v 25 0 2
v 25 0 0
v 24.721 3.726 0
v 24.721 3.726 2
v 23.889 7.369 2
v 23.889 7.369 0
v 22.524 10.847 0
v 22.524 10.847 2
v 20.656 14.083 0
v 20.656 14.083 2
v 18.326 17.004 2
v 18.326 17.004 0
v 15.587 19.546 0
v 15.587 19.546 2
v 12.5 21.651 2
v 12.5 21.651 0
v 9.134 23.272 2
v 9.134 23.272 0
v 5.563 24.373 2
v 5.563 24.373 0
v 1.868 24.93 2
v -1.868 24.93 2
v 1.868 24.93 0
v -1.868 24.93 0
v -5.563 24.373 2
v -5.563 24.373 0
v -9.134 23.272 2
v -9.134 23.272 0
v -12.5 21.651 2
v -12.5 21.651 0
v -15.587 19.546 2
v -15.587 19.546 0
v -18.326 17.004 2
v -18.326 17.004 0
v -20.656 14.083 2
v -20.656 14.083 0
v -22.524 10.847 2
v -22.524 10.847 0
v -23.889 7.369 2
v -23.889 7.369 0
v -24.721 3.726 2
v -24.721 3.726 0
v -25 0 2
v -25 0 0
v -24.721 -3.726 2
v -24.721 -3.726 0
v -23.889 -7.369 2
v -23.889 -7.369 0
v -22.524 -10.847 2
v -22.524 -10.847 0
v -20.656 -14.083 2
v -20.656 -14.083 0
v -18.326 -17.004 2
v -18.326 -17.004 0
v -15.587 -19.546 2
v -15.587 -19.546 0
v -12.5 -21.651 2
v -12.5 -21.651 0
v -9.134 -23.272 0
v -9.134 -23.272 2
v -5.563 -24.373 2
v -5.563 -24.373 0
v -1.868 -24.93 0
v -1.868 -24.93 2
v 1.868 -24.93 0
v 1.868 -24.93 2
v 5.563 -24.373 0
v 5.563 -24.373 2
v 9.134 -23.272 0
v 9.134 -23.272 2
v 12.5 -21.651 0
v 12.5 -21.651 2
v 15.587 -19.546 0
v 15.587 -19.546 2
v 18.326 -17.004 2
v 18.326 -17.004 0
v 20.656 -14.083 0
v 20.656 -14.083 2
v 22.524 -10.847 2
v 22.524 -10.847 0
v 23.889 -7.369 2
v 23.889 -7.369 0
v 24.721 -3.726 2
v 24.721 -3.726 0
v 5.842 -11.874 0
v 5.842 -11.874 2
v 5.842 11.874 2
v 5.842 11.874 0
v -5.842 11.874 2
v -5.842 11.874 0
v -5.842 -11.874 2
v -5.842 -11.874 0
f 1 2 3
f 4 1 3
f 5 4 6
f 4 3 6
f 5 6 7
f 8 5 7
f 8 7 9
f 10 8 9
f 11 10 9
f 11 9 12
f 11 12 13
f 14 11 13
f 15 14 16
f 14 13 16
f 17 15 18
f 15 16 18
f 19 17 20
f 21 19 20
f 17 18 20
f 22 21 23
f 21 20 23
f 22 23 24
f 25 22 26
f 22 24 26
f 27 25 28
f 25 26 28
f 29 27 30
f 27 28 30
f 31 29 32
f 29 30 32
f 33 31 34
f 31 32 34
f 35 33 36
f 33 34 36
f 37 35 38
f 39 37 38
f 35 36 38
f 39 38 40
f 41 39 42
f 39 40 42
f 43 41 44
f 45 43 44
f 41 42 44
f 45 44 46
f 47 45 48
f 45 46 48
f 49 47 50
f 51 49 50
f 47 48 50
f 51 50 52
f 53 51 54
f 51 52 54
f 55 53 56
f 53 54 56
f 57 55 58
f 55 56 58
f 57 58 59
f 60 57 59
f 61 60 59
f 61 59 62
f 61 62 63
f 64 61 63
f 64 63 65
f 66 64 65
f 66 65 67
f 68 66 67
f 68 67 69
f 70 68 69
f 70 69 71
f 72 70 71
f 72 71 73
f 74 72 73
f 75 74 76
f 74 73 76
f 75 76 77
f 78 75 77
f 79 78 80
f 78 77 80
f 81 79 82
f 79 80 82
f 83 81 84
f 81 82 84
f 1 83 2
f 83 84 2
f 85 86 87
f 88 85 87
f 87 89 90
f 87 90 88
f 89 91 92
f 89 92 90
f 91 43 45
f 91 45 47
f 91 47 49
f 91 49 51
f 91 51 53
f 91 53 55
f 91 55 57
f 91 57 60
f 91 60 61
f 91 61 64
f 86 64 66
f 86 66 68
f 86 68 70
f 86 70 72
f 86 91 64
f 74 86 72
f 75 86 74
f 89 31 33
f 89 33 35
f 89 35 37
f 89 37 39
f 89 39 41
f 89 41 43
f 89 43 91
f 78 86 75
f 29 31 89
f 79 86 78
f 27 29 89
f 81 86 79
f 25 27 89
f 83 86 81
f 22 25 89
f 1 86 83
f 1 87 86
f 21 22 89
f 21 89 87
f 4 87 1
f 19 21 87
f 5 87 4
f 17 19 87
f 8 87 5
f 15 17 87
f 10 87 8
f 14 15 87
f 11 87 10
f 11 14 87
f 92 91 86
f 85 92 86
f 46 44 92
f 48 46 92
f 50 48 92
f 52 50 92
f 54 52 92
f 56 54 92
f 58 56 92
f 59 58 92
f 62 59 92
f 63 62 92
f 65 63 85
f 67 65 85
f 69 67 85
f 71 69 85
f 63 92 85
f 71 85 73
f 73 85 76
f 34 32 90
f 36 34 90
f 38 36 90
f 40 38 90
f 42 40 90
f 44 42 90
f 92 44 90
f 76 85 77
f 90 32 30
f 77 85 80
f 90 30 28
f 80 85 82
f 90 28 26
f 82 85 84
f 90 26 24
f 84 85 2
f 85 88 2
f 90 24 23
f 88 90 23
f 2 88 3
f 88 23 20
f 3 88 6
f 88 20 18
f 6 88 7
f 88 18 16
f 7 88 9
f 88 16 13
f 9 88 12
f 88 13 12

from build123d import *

# Parameters (mm, degrees)
ESQUISSE1_R             = 25
BOSS_EXTRU_1_DEPTH      = 2
ENL_V_MAT_EXTRU_1_REACH = 37.412
ESQUISSE2_W             = 11.684
ESQUISSE2_H             = 23.749


with BuildPart() as part:
    # Esquisse1 → Boss.-Extru.1 (new body)
    with BuildSketch(Plane.XY):
        Circle(ESQUISSE1_R)
    extrude(amount=BOSS_EXTRU_1_DEPTH)

    # Esquisse2 → Enlèv. mat.-Extru.1 (cut, up to next)
    with BuildSketch(Plane.XY.offset(2), mode=Mode.PRIVATE) as enl_v_mat_extru_1_sk1:
        Rectangle(ESQUISSE2_W, ESQUISSE2_H)
    enl_v_mat_extru_1_tool1 = extrude(enl_v_mat_extru_1_sk1.sketch, amount=-ENL_V_MAT_EXTRU_1_REACH, mode=Mode.PRIVATE) & part.part
    add(enl_v_mat_extru_1_tool1.solids().sort_by_distance((0, 0, 2))[0], mode=Mode.SUBTRACT)


solid = part.part
